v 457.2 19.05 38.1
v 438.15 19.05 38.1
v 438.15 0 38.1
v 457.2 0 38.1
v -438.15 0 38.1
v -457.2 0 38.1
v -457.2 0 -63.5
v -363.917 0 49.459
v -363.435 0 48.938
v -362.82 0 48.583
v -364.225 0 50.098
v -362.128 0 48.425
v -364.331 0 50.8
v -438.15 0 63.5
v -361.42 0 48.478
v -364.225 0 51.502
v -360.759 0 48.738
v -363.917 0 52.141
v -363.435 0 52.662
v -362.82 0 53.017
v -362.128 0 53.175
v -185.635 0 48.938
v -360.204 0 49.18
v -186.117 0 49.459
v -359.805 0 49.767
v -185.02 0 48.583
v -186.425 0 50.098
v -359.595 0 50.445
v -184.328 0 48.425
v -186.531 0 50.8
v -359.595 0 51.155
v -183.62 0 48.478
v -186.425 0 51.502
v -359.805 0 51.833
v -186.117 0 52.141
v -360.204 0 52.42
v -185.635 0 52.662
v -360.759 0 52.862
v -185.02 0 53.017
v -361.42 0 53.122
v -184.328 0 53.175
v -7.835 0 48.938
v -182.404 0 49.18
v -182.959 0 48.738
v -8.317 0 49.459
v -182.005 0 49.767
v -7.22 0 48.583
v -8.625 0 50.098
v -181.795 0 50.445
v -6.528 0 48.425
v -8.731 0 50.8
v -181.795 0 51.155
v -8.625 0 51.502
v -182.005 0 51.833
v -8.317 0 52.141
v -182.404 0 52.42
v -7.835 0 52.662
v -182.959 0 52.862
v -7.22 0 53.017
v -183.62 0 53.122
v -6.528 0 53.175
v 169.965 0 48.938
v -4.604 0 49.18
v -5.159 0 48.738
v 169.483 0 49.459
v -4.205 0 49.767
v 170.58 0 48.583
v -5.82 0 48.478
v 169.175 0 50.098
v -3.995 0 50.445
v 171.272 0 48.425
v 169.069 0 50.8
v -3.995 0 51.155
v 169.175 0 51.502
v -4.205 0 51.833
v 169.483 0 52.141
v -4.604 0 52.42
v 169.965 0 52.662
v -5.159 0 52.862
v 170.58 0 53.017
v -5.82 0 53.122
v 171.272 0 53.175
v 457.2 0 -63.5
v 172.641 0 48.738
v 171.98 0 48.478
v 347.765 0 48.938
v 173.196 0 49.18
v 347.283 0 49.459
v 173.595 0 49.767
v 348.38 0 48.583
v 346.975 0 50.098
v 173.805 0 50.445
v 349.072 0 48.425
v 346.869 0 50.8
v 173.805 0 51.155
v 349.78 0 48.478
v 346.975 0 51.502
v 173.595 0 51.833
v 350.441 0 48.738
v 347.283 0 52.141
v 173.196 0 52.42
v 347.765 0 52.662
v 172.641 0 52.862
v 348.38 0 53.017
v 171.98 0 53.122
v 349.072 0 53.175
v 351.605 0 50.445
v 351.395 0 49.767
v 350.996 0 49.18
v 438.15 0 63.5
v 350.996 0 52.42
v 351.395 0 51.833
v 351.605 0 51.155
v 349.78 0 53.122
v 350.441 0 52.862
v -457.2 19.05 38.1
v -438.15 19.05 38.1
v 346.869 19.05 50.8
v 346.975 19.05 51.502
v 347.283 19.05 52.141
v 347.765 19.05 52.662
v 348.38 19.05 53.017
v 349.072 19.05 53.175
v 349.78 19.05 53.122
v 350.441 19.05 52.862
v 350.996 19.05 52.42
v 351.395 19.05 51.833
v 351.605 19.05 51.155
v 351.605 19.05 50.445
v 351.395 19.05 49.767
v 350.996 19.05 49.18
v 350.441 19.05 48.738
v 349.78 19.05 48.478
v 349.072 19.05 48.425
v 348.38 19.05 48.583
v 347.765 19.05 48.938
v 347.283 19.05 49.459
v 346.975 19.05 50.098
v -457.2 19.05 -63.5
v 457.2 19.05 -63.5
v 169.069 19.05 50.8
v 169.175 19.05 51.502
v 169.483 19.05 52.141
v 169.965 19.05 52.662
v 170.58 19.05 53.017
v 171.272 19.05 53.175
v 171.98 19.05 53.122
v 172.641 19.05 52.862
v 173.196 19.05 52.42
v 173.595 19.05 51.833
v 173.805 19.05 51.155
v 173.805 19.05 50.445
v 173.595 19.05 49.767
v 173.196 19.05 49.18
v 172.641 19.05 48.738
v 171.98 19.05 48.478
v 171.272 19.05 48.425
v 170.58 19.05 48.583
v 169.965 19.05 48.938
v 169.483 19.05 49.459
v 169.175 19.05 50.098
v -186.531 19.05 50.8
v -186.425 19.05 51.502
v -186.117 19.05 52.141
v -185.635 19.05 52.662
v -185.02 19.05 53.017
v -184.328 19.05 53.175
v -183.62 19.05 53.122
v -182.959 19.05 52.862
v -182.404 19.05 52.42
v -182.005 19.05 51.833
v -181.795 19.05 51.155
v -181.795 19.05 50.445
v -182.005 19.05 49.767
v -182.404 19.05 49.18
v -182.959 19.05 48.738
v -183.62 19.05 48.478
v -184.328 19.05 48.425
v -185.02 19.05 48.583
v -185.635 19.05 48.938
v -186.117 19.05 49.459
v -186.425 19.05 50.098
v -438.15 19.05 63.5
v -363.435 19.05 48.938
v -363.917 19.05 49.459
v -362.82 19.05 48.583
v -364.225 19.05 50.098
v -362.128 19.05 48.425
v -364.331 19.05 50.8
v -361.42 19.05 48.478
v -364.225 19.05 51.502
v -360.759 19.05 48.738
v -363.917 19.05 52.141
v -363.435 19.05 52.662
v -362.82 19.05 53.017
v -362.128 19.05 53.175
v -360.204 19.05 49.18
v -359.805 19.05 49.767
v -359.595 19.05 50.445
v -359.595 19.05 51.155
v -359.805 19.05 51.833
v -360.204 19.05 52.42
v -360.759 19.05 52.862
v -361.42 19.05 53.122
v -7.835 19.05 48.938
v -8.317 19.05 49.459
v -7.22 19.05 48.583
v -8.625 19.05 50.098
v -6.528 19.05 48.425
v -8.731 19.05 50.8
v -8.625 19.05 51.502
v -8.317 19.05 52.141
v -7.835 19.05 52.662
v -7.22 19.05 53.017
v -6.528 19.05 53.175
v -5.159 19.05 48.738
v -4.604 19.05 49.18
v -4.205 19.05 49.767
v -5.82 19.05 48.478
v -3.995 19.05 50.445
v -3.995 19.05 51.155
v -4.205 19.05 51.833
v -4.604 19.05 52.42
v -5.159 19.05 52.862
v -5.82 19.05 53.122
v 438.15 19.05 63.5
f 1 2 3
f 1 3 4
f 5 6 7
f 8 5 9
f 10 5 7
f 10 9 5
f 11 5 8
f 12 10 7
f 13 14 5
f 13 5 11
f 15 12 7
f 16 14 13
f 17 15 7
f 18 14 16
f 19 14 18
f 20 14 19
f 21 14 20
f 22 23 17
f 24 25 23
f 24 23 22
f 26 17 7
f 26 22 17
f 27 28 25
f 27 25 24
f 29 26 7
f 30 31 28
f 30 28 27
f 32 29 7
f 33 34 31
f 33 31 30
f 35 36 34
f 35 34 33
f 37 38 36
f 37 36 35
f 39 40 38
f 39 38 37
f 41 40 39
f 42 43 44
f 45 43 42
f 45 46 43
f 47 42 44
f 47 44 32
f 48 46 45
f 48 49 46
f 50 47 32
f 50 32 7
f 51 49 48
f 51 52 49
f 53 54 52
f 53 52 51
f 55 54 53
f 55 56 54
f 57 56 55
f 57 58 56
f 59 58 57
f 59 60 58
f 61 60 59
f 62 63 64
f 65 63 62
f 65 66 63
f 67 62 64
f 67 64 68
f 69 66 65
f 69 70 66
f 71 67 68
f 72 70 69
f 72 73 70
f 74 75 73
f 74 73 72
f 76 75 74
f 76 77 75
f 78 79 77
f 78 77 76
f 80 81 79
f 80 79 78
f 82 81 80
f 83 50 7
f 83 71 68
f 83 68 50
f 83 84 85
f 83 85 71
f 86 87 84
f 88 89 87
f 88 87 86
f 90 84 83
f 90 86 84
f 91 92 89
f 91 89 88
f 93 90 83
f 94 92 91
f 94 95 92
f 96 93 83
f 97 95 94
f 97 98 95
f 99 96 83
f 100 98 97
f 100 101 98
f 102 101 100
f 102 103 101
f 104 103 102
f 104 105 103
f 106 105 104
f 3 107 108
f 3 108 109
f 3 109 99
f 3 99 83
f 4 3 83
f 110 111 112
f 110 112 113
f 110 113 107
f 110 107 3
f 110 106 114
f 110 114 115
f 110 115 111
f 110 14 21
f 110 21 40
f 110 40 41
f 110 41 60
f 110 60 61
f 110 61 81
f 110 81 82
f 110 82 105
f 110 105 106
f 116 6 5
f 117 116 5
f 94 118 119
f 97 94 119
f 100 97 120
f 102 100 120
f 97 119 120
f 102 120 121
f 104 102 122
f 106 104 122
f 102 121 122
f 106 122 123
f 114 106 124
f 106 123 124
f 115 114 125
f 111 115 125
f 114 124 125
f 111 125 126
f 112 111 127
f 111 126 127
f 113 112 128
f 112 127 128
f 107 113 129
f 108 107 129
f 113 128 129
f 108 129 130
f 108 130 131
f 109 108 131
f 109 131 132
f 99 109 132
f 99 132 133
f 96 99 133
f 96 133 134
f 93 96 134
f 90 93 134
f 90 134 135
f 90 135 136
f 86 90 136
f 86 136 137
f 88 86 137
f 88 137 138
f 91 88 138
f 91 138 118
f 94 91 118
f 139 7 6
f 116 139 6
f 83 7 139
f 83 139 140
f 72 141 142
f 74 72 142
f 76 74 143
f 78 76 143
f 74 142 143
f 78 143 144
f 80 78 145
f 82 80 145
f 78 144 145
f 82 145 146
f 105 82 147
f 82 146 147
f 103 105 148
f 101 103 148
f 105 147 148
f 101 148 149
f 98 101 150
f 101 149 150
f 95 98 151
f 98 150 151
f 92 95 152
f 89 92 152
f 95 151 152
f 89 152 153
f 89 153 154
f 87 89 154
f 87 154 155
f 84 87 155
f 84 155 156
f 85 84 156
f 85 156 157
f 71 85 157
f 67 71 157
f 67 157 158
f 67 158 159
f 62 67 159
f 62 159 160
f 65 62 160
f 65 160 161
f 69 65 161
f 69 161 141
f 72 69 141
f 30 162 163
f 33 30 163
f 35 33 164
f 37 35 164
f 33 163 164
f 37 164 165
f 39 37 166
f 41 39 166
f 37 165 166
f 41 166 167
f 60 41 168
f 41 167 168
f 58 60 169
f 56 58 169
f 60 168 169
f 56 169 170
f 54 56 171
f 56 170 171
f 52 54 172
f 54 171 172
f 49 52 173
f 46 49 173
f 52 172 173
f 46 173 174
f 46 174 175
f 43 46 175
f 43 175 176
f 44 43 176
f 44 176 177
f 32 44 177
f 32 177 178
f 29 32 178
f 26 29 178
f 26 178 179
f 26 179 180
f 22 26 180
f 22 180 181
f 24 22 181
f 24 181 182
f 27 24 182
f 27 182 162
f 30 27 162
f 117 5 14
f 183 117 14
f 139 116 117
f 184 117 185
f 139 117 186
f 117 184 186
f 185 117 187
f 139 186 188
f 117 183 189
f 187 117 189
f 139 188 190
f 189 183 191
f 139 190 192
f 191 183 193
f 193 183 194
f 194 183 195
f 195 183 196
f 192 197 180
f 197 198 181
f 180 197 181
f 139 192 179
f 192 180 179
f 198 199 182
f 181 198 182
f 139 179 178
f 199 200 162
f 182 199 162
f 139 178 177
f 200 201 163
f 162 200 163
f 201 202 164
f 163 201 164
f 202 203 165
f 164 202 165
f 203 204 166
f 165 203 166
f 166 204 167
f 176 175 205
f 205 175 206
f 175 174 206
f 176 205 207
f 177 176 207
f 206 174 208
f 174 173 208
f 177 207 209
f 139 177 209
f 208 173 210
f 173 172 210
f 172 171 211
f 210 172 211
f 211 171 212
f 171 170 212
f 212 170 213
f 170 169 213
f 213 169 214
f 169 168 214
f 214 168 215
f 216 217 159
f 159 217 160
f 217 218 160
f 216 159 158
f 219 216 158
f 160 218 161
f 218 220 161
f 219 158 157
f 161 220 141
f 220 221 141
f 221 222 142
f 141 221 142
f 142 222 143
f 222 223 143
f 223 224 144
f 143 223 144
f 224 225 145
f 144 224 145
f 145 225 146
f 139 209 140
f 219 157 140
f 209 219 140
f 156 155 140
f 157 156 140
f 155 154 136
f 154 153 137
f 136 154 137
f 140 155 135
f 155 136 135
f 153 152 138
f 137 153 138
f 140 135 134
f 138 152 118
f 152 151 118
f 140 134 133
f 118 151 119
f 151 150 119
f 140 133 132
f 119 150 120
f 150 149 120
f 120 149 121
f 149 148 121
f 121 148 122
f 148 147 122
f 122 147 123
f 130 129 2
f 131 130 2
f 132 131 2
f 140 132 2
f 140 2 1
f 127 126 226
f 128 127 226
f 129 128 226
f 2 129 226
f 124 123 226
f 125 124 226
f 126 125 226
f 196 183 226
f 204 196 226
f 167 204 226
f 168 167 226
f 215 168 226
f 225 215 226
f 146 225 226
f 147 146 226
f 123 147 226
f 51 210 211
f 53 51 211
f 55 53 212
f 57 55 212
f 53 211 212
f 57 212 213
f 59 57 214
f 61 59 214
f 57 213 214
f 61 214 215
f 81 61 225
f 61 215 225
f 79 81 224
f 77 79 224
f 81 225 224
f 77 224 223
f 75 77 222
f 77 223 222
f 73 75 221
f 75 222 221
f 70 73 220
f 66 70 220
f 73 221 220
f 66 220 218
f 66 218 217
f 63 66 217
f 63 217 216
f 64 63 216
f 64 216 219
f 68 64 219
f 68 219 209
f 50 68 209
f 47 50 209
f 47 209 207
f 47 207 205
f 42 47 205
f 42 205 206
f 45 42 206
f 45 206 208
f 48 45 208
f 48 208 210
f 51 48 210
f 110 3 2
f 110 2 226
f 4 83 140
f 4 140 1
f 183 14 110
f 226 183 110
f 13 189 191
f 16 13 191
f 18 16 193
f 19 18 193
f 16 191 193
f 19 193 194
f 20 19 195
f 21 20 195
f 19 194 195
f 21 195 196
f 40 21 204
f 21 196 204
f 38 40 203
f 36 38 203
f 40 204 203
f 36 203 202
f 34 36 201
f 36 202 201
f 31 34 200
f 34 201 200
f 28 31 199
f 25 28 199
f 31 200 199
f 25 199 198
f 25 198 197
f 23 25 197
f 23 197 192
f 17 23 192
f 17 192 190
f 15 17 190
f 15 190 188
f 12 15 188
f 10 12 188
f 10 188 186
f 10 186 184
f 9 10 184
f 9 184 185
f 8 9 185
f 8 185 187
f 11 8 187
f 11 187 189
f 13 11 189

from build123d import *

# Parameters (mm, degrees)
F0_W     = 914.4
F0_H     = 127
F1_DEPTH = 19.05
F2_W     = 19.05
F2_H     = 25.4
F3_DEPTH = 19.051
F5_D     = 4.7625


with BuildPart() as f1:
    # F0 (on Front) → F1 (new body)
    with BuildSketch(Plane.XZ):
        Rectangle(F0_W, F0_H)
    extrude(amount=-F1_DEPTH)

    # F2 (on face) → F3 (cut, through all)
    with BuildSketch(Plane.XZ):
        with Locations((-447.675, 50.8)):
            Rectangle(F2_W, F2_H)
        with Locations((447.675, 50.8)):
            Rectangle(F2_W, F2_H)
    extrude(amount=-F3_DEPTH, mode=Mode.SUBTRACT)

    # F5 (through all)
    with Locations(Plane.XZ):
        with Locations((-361.95, 50.8), (-184.15, 50.8), (-6.35, 50.8), (171.45, 50.8), (349.25, 50.8)):
            Hole(F5_D / 2)


solid = f1.part
